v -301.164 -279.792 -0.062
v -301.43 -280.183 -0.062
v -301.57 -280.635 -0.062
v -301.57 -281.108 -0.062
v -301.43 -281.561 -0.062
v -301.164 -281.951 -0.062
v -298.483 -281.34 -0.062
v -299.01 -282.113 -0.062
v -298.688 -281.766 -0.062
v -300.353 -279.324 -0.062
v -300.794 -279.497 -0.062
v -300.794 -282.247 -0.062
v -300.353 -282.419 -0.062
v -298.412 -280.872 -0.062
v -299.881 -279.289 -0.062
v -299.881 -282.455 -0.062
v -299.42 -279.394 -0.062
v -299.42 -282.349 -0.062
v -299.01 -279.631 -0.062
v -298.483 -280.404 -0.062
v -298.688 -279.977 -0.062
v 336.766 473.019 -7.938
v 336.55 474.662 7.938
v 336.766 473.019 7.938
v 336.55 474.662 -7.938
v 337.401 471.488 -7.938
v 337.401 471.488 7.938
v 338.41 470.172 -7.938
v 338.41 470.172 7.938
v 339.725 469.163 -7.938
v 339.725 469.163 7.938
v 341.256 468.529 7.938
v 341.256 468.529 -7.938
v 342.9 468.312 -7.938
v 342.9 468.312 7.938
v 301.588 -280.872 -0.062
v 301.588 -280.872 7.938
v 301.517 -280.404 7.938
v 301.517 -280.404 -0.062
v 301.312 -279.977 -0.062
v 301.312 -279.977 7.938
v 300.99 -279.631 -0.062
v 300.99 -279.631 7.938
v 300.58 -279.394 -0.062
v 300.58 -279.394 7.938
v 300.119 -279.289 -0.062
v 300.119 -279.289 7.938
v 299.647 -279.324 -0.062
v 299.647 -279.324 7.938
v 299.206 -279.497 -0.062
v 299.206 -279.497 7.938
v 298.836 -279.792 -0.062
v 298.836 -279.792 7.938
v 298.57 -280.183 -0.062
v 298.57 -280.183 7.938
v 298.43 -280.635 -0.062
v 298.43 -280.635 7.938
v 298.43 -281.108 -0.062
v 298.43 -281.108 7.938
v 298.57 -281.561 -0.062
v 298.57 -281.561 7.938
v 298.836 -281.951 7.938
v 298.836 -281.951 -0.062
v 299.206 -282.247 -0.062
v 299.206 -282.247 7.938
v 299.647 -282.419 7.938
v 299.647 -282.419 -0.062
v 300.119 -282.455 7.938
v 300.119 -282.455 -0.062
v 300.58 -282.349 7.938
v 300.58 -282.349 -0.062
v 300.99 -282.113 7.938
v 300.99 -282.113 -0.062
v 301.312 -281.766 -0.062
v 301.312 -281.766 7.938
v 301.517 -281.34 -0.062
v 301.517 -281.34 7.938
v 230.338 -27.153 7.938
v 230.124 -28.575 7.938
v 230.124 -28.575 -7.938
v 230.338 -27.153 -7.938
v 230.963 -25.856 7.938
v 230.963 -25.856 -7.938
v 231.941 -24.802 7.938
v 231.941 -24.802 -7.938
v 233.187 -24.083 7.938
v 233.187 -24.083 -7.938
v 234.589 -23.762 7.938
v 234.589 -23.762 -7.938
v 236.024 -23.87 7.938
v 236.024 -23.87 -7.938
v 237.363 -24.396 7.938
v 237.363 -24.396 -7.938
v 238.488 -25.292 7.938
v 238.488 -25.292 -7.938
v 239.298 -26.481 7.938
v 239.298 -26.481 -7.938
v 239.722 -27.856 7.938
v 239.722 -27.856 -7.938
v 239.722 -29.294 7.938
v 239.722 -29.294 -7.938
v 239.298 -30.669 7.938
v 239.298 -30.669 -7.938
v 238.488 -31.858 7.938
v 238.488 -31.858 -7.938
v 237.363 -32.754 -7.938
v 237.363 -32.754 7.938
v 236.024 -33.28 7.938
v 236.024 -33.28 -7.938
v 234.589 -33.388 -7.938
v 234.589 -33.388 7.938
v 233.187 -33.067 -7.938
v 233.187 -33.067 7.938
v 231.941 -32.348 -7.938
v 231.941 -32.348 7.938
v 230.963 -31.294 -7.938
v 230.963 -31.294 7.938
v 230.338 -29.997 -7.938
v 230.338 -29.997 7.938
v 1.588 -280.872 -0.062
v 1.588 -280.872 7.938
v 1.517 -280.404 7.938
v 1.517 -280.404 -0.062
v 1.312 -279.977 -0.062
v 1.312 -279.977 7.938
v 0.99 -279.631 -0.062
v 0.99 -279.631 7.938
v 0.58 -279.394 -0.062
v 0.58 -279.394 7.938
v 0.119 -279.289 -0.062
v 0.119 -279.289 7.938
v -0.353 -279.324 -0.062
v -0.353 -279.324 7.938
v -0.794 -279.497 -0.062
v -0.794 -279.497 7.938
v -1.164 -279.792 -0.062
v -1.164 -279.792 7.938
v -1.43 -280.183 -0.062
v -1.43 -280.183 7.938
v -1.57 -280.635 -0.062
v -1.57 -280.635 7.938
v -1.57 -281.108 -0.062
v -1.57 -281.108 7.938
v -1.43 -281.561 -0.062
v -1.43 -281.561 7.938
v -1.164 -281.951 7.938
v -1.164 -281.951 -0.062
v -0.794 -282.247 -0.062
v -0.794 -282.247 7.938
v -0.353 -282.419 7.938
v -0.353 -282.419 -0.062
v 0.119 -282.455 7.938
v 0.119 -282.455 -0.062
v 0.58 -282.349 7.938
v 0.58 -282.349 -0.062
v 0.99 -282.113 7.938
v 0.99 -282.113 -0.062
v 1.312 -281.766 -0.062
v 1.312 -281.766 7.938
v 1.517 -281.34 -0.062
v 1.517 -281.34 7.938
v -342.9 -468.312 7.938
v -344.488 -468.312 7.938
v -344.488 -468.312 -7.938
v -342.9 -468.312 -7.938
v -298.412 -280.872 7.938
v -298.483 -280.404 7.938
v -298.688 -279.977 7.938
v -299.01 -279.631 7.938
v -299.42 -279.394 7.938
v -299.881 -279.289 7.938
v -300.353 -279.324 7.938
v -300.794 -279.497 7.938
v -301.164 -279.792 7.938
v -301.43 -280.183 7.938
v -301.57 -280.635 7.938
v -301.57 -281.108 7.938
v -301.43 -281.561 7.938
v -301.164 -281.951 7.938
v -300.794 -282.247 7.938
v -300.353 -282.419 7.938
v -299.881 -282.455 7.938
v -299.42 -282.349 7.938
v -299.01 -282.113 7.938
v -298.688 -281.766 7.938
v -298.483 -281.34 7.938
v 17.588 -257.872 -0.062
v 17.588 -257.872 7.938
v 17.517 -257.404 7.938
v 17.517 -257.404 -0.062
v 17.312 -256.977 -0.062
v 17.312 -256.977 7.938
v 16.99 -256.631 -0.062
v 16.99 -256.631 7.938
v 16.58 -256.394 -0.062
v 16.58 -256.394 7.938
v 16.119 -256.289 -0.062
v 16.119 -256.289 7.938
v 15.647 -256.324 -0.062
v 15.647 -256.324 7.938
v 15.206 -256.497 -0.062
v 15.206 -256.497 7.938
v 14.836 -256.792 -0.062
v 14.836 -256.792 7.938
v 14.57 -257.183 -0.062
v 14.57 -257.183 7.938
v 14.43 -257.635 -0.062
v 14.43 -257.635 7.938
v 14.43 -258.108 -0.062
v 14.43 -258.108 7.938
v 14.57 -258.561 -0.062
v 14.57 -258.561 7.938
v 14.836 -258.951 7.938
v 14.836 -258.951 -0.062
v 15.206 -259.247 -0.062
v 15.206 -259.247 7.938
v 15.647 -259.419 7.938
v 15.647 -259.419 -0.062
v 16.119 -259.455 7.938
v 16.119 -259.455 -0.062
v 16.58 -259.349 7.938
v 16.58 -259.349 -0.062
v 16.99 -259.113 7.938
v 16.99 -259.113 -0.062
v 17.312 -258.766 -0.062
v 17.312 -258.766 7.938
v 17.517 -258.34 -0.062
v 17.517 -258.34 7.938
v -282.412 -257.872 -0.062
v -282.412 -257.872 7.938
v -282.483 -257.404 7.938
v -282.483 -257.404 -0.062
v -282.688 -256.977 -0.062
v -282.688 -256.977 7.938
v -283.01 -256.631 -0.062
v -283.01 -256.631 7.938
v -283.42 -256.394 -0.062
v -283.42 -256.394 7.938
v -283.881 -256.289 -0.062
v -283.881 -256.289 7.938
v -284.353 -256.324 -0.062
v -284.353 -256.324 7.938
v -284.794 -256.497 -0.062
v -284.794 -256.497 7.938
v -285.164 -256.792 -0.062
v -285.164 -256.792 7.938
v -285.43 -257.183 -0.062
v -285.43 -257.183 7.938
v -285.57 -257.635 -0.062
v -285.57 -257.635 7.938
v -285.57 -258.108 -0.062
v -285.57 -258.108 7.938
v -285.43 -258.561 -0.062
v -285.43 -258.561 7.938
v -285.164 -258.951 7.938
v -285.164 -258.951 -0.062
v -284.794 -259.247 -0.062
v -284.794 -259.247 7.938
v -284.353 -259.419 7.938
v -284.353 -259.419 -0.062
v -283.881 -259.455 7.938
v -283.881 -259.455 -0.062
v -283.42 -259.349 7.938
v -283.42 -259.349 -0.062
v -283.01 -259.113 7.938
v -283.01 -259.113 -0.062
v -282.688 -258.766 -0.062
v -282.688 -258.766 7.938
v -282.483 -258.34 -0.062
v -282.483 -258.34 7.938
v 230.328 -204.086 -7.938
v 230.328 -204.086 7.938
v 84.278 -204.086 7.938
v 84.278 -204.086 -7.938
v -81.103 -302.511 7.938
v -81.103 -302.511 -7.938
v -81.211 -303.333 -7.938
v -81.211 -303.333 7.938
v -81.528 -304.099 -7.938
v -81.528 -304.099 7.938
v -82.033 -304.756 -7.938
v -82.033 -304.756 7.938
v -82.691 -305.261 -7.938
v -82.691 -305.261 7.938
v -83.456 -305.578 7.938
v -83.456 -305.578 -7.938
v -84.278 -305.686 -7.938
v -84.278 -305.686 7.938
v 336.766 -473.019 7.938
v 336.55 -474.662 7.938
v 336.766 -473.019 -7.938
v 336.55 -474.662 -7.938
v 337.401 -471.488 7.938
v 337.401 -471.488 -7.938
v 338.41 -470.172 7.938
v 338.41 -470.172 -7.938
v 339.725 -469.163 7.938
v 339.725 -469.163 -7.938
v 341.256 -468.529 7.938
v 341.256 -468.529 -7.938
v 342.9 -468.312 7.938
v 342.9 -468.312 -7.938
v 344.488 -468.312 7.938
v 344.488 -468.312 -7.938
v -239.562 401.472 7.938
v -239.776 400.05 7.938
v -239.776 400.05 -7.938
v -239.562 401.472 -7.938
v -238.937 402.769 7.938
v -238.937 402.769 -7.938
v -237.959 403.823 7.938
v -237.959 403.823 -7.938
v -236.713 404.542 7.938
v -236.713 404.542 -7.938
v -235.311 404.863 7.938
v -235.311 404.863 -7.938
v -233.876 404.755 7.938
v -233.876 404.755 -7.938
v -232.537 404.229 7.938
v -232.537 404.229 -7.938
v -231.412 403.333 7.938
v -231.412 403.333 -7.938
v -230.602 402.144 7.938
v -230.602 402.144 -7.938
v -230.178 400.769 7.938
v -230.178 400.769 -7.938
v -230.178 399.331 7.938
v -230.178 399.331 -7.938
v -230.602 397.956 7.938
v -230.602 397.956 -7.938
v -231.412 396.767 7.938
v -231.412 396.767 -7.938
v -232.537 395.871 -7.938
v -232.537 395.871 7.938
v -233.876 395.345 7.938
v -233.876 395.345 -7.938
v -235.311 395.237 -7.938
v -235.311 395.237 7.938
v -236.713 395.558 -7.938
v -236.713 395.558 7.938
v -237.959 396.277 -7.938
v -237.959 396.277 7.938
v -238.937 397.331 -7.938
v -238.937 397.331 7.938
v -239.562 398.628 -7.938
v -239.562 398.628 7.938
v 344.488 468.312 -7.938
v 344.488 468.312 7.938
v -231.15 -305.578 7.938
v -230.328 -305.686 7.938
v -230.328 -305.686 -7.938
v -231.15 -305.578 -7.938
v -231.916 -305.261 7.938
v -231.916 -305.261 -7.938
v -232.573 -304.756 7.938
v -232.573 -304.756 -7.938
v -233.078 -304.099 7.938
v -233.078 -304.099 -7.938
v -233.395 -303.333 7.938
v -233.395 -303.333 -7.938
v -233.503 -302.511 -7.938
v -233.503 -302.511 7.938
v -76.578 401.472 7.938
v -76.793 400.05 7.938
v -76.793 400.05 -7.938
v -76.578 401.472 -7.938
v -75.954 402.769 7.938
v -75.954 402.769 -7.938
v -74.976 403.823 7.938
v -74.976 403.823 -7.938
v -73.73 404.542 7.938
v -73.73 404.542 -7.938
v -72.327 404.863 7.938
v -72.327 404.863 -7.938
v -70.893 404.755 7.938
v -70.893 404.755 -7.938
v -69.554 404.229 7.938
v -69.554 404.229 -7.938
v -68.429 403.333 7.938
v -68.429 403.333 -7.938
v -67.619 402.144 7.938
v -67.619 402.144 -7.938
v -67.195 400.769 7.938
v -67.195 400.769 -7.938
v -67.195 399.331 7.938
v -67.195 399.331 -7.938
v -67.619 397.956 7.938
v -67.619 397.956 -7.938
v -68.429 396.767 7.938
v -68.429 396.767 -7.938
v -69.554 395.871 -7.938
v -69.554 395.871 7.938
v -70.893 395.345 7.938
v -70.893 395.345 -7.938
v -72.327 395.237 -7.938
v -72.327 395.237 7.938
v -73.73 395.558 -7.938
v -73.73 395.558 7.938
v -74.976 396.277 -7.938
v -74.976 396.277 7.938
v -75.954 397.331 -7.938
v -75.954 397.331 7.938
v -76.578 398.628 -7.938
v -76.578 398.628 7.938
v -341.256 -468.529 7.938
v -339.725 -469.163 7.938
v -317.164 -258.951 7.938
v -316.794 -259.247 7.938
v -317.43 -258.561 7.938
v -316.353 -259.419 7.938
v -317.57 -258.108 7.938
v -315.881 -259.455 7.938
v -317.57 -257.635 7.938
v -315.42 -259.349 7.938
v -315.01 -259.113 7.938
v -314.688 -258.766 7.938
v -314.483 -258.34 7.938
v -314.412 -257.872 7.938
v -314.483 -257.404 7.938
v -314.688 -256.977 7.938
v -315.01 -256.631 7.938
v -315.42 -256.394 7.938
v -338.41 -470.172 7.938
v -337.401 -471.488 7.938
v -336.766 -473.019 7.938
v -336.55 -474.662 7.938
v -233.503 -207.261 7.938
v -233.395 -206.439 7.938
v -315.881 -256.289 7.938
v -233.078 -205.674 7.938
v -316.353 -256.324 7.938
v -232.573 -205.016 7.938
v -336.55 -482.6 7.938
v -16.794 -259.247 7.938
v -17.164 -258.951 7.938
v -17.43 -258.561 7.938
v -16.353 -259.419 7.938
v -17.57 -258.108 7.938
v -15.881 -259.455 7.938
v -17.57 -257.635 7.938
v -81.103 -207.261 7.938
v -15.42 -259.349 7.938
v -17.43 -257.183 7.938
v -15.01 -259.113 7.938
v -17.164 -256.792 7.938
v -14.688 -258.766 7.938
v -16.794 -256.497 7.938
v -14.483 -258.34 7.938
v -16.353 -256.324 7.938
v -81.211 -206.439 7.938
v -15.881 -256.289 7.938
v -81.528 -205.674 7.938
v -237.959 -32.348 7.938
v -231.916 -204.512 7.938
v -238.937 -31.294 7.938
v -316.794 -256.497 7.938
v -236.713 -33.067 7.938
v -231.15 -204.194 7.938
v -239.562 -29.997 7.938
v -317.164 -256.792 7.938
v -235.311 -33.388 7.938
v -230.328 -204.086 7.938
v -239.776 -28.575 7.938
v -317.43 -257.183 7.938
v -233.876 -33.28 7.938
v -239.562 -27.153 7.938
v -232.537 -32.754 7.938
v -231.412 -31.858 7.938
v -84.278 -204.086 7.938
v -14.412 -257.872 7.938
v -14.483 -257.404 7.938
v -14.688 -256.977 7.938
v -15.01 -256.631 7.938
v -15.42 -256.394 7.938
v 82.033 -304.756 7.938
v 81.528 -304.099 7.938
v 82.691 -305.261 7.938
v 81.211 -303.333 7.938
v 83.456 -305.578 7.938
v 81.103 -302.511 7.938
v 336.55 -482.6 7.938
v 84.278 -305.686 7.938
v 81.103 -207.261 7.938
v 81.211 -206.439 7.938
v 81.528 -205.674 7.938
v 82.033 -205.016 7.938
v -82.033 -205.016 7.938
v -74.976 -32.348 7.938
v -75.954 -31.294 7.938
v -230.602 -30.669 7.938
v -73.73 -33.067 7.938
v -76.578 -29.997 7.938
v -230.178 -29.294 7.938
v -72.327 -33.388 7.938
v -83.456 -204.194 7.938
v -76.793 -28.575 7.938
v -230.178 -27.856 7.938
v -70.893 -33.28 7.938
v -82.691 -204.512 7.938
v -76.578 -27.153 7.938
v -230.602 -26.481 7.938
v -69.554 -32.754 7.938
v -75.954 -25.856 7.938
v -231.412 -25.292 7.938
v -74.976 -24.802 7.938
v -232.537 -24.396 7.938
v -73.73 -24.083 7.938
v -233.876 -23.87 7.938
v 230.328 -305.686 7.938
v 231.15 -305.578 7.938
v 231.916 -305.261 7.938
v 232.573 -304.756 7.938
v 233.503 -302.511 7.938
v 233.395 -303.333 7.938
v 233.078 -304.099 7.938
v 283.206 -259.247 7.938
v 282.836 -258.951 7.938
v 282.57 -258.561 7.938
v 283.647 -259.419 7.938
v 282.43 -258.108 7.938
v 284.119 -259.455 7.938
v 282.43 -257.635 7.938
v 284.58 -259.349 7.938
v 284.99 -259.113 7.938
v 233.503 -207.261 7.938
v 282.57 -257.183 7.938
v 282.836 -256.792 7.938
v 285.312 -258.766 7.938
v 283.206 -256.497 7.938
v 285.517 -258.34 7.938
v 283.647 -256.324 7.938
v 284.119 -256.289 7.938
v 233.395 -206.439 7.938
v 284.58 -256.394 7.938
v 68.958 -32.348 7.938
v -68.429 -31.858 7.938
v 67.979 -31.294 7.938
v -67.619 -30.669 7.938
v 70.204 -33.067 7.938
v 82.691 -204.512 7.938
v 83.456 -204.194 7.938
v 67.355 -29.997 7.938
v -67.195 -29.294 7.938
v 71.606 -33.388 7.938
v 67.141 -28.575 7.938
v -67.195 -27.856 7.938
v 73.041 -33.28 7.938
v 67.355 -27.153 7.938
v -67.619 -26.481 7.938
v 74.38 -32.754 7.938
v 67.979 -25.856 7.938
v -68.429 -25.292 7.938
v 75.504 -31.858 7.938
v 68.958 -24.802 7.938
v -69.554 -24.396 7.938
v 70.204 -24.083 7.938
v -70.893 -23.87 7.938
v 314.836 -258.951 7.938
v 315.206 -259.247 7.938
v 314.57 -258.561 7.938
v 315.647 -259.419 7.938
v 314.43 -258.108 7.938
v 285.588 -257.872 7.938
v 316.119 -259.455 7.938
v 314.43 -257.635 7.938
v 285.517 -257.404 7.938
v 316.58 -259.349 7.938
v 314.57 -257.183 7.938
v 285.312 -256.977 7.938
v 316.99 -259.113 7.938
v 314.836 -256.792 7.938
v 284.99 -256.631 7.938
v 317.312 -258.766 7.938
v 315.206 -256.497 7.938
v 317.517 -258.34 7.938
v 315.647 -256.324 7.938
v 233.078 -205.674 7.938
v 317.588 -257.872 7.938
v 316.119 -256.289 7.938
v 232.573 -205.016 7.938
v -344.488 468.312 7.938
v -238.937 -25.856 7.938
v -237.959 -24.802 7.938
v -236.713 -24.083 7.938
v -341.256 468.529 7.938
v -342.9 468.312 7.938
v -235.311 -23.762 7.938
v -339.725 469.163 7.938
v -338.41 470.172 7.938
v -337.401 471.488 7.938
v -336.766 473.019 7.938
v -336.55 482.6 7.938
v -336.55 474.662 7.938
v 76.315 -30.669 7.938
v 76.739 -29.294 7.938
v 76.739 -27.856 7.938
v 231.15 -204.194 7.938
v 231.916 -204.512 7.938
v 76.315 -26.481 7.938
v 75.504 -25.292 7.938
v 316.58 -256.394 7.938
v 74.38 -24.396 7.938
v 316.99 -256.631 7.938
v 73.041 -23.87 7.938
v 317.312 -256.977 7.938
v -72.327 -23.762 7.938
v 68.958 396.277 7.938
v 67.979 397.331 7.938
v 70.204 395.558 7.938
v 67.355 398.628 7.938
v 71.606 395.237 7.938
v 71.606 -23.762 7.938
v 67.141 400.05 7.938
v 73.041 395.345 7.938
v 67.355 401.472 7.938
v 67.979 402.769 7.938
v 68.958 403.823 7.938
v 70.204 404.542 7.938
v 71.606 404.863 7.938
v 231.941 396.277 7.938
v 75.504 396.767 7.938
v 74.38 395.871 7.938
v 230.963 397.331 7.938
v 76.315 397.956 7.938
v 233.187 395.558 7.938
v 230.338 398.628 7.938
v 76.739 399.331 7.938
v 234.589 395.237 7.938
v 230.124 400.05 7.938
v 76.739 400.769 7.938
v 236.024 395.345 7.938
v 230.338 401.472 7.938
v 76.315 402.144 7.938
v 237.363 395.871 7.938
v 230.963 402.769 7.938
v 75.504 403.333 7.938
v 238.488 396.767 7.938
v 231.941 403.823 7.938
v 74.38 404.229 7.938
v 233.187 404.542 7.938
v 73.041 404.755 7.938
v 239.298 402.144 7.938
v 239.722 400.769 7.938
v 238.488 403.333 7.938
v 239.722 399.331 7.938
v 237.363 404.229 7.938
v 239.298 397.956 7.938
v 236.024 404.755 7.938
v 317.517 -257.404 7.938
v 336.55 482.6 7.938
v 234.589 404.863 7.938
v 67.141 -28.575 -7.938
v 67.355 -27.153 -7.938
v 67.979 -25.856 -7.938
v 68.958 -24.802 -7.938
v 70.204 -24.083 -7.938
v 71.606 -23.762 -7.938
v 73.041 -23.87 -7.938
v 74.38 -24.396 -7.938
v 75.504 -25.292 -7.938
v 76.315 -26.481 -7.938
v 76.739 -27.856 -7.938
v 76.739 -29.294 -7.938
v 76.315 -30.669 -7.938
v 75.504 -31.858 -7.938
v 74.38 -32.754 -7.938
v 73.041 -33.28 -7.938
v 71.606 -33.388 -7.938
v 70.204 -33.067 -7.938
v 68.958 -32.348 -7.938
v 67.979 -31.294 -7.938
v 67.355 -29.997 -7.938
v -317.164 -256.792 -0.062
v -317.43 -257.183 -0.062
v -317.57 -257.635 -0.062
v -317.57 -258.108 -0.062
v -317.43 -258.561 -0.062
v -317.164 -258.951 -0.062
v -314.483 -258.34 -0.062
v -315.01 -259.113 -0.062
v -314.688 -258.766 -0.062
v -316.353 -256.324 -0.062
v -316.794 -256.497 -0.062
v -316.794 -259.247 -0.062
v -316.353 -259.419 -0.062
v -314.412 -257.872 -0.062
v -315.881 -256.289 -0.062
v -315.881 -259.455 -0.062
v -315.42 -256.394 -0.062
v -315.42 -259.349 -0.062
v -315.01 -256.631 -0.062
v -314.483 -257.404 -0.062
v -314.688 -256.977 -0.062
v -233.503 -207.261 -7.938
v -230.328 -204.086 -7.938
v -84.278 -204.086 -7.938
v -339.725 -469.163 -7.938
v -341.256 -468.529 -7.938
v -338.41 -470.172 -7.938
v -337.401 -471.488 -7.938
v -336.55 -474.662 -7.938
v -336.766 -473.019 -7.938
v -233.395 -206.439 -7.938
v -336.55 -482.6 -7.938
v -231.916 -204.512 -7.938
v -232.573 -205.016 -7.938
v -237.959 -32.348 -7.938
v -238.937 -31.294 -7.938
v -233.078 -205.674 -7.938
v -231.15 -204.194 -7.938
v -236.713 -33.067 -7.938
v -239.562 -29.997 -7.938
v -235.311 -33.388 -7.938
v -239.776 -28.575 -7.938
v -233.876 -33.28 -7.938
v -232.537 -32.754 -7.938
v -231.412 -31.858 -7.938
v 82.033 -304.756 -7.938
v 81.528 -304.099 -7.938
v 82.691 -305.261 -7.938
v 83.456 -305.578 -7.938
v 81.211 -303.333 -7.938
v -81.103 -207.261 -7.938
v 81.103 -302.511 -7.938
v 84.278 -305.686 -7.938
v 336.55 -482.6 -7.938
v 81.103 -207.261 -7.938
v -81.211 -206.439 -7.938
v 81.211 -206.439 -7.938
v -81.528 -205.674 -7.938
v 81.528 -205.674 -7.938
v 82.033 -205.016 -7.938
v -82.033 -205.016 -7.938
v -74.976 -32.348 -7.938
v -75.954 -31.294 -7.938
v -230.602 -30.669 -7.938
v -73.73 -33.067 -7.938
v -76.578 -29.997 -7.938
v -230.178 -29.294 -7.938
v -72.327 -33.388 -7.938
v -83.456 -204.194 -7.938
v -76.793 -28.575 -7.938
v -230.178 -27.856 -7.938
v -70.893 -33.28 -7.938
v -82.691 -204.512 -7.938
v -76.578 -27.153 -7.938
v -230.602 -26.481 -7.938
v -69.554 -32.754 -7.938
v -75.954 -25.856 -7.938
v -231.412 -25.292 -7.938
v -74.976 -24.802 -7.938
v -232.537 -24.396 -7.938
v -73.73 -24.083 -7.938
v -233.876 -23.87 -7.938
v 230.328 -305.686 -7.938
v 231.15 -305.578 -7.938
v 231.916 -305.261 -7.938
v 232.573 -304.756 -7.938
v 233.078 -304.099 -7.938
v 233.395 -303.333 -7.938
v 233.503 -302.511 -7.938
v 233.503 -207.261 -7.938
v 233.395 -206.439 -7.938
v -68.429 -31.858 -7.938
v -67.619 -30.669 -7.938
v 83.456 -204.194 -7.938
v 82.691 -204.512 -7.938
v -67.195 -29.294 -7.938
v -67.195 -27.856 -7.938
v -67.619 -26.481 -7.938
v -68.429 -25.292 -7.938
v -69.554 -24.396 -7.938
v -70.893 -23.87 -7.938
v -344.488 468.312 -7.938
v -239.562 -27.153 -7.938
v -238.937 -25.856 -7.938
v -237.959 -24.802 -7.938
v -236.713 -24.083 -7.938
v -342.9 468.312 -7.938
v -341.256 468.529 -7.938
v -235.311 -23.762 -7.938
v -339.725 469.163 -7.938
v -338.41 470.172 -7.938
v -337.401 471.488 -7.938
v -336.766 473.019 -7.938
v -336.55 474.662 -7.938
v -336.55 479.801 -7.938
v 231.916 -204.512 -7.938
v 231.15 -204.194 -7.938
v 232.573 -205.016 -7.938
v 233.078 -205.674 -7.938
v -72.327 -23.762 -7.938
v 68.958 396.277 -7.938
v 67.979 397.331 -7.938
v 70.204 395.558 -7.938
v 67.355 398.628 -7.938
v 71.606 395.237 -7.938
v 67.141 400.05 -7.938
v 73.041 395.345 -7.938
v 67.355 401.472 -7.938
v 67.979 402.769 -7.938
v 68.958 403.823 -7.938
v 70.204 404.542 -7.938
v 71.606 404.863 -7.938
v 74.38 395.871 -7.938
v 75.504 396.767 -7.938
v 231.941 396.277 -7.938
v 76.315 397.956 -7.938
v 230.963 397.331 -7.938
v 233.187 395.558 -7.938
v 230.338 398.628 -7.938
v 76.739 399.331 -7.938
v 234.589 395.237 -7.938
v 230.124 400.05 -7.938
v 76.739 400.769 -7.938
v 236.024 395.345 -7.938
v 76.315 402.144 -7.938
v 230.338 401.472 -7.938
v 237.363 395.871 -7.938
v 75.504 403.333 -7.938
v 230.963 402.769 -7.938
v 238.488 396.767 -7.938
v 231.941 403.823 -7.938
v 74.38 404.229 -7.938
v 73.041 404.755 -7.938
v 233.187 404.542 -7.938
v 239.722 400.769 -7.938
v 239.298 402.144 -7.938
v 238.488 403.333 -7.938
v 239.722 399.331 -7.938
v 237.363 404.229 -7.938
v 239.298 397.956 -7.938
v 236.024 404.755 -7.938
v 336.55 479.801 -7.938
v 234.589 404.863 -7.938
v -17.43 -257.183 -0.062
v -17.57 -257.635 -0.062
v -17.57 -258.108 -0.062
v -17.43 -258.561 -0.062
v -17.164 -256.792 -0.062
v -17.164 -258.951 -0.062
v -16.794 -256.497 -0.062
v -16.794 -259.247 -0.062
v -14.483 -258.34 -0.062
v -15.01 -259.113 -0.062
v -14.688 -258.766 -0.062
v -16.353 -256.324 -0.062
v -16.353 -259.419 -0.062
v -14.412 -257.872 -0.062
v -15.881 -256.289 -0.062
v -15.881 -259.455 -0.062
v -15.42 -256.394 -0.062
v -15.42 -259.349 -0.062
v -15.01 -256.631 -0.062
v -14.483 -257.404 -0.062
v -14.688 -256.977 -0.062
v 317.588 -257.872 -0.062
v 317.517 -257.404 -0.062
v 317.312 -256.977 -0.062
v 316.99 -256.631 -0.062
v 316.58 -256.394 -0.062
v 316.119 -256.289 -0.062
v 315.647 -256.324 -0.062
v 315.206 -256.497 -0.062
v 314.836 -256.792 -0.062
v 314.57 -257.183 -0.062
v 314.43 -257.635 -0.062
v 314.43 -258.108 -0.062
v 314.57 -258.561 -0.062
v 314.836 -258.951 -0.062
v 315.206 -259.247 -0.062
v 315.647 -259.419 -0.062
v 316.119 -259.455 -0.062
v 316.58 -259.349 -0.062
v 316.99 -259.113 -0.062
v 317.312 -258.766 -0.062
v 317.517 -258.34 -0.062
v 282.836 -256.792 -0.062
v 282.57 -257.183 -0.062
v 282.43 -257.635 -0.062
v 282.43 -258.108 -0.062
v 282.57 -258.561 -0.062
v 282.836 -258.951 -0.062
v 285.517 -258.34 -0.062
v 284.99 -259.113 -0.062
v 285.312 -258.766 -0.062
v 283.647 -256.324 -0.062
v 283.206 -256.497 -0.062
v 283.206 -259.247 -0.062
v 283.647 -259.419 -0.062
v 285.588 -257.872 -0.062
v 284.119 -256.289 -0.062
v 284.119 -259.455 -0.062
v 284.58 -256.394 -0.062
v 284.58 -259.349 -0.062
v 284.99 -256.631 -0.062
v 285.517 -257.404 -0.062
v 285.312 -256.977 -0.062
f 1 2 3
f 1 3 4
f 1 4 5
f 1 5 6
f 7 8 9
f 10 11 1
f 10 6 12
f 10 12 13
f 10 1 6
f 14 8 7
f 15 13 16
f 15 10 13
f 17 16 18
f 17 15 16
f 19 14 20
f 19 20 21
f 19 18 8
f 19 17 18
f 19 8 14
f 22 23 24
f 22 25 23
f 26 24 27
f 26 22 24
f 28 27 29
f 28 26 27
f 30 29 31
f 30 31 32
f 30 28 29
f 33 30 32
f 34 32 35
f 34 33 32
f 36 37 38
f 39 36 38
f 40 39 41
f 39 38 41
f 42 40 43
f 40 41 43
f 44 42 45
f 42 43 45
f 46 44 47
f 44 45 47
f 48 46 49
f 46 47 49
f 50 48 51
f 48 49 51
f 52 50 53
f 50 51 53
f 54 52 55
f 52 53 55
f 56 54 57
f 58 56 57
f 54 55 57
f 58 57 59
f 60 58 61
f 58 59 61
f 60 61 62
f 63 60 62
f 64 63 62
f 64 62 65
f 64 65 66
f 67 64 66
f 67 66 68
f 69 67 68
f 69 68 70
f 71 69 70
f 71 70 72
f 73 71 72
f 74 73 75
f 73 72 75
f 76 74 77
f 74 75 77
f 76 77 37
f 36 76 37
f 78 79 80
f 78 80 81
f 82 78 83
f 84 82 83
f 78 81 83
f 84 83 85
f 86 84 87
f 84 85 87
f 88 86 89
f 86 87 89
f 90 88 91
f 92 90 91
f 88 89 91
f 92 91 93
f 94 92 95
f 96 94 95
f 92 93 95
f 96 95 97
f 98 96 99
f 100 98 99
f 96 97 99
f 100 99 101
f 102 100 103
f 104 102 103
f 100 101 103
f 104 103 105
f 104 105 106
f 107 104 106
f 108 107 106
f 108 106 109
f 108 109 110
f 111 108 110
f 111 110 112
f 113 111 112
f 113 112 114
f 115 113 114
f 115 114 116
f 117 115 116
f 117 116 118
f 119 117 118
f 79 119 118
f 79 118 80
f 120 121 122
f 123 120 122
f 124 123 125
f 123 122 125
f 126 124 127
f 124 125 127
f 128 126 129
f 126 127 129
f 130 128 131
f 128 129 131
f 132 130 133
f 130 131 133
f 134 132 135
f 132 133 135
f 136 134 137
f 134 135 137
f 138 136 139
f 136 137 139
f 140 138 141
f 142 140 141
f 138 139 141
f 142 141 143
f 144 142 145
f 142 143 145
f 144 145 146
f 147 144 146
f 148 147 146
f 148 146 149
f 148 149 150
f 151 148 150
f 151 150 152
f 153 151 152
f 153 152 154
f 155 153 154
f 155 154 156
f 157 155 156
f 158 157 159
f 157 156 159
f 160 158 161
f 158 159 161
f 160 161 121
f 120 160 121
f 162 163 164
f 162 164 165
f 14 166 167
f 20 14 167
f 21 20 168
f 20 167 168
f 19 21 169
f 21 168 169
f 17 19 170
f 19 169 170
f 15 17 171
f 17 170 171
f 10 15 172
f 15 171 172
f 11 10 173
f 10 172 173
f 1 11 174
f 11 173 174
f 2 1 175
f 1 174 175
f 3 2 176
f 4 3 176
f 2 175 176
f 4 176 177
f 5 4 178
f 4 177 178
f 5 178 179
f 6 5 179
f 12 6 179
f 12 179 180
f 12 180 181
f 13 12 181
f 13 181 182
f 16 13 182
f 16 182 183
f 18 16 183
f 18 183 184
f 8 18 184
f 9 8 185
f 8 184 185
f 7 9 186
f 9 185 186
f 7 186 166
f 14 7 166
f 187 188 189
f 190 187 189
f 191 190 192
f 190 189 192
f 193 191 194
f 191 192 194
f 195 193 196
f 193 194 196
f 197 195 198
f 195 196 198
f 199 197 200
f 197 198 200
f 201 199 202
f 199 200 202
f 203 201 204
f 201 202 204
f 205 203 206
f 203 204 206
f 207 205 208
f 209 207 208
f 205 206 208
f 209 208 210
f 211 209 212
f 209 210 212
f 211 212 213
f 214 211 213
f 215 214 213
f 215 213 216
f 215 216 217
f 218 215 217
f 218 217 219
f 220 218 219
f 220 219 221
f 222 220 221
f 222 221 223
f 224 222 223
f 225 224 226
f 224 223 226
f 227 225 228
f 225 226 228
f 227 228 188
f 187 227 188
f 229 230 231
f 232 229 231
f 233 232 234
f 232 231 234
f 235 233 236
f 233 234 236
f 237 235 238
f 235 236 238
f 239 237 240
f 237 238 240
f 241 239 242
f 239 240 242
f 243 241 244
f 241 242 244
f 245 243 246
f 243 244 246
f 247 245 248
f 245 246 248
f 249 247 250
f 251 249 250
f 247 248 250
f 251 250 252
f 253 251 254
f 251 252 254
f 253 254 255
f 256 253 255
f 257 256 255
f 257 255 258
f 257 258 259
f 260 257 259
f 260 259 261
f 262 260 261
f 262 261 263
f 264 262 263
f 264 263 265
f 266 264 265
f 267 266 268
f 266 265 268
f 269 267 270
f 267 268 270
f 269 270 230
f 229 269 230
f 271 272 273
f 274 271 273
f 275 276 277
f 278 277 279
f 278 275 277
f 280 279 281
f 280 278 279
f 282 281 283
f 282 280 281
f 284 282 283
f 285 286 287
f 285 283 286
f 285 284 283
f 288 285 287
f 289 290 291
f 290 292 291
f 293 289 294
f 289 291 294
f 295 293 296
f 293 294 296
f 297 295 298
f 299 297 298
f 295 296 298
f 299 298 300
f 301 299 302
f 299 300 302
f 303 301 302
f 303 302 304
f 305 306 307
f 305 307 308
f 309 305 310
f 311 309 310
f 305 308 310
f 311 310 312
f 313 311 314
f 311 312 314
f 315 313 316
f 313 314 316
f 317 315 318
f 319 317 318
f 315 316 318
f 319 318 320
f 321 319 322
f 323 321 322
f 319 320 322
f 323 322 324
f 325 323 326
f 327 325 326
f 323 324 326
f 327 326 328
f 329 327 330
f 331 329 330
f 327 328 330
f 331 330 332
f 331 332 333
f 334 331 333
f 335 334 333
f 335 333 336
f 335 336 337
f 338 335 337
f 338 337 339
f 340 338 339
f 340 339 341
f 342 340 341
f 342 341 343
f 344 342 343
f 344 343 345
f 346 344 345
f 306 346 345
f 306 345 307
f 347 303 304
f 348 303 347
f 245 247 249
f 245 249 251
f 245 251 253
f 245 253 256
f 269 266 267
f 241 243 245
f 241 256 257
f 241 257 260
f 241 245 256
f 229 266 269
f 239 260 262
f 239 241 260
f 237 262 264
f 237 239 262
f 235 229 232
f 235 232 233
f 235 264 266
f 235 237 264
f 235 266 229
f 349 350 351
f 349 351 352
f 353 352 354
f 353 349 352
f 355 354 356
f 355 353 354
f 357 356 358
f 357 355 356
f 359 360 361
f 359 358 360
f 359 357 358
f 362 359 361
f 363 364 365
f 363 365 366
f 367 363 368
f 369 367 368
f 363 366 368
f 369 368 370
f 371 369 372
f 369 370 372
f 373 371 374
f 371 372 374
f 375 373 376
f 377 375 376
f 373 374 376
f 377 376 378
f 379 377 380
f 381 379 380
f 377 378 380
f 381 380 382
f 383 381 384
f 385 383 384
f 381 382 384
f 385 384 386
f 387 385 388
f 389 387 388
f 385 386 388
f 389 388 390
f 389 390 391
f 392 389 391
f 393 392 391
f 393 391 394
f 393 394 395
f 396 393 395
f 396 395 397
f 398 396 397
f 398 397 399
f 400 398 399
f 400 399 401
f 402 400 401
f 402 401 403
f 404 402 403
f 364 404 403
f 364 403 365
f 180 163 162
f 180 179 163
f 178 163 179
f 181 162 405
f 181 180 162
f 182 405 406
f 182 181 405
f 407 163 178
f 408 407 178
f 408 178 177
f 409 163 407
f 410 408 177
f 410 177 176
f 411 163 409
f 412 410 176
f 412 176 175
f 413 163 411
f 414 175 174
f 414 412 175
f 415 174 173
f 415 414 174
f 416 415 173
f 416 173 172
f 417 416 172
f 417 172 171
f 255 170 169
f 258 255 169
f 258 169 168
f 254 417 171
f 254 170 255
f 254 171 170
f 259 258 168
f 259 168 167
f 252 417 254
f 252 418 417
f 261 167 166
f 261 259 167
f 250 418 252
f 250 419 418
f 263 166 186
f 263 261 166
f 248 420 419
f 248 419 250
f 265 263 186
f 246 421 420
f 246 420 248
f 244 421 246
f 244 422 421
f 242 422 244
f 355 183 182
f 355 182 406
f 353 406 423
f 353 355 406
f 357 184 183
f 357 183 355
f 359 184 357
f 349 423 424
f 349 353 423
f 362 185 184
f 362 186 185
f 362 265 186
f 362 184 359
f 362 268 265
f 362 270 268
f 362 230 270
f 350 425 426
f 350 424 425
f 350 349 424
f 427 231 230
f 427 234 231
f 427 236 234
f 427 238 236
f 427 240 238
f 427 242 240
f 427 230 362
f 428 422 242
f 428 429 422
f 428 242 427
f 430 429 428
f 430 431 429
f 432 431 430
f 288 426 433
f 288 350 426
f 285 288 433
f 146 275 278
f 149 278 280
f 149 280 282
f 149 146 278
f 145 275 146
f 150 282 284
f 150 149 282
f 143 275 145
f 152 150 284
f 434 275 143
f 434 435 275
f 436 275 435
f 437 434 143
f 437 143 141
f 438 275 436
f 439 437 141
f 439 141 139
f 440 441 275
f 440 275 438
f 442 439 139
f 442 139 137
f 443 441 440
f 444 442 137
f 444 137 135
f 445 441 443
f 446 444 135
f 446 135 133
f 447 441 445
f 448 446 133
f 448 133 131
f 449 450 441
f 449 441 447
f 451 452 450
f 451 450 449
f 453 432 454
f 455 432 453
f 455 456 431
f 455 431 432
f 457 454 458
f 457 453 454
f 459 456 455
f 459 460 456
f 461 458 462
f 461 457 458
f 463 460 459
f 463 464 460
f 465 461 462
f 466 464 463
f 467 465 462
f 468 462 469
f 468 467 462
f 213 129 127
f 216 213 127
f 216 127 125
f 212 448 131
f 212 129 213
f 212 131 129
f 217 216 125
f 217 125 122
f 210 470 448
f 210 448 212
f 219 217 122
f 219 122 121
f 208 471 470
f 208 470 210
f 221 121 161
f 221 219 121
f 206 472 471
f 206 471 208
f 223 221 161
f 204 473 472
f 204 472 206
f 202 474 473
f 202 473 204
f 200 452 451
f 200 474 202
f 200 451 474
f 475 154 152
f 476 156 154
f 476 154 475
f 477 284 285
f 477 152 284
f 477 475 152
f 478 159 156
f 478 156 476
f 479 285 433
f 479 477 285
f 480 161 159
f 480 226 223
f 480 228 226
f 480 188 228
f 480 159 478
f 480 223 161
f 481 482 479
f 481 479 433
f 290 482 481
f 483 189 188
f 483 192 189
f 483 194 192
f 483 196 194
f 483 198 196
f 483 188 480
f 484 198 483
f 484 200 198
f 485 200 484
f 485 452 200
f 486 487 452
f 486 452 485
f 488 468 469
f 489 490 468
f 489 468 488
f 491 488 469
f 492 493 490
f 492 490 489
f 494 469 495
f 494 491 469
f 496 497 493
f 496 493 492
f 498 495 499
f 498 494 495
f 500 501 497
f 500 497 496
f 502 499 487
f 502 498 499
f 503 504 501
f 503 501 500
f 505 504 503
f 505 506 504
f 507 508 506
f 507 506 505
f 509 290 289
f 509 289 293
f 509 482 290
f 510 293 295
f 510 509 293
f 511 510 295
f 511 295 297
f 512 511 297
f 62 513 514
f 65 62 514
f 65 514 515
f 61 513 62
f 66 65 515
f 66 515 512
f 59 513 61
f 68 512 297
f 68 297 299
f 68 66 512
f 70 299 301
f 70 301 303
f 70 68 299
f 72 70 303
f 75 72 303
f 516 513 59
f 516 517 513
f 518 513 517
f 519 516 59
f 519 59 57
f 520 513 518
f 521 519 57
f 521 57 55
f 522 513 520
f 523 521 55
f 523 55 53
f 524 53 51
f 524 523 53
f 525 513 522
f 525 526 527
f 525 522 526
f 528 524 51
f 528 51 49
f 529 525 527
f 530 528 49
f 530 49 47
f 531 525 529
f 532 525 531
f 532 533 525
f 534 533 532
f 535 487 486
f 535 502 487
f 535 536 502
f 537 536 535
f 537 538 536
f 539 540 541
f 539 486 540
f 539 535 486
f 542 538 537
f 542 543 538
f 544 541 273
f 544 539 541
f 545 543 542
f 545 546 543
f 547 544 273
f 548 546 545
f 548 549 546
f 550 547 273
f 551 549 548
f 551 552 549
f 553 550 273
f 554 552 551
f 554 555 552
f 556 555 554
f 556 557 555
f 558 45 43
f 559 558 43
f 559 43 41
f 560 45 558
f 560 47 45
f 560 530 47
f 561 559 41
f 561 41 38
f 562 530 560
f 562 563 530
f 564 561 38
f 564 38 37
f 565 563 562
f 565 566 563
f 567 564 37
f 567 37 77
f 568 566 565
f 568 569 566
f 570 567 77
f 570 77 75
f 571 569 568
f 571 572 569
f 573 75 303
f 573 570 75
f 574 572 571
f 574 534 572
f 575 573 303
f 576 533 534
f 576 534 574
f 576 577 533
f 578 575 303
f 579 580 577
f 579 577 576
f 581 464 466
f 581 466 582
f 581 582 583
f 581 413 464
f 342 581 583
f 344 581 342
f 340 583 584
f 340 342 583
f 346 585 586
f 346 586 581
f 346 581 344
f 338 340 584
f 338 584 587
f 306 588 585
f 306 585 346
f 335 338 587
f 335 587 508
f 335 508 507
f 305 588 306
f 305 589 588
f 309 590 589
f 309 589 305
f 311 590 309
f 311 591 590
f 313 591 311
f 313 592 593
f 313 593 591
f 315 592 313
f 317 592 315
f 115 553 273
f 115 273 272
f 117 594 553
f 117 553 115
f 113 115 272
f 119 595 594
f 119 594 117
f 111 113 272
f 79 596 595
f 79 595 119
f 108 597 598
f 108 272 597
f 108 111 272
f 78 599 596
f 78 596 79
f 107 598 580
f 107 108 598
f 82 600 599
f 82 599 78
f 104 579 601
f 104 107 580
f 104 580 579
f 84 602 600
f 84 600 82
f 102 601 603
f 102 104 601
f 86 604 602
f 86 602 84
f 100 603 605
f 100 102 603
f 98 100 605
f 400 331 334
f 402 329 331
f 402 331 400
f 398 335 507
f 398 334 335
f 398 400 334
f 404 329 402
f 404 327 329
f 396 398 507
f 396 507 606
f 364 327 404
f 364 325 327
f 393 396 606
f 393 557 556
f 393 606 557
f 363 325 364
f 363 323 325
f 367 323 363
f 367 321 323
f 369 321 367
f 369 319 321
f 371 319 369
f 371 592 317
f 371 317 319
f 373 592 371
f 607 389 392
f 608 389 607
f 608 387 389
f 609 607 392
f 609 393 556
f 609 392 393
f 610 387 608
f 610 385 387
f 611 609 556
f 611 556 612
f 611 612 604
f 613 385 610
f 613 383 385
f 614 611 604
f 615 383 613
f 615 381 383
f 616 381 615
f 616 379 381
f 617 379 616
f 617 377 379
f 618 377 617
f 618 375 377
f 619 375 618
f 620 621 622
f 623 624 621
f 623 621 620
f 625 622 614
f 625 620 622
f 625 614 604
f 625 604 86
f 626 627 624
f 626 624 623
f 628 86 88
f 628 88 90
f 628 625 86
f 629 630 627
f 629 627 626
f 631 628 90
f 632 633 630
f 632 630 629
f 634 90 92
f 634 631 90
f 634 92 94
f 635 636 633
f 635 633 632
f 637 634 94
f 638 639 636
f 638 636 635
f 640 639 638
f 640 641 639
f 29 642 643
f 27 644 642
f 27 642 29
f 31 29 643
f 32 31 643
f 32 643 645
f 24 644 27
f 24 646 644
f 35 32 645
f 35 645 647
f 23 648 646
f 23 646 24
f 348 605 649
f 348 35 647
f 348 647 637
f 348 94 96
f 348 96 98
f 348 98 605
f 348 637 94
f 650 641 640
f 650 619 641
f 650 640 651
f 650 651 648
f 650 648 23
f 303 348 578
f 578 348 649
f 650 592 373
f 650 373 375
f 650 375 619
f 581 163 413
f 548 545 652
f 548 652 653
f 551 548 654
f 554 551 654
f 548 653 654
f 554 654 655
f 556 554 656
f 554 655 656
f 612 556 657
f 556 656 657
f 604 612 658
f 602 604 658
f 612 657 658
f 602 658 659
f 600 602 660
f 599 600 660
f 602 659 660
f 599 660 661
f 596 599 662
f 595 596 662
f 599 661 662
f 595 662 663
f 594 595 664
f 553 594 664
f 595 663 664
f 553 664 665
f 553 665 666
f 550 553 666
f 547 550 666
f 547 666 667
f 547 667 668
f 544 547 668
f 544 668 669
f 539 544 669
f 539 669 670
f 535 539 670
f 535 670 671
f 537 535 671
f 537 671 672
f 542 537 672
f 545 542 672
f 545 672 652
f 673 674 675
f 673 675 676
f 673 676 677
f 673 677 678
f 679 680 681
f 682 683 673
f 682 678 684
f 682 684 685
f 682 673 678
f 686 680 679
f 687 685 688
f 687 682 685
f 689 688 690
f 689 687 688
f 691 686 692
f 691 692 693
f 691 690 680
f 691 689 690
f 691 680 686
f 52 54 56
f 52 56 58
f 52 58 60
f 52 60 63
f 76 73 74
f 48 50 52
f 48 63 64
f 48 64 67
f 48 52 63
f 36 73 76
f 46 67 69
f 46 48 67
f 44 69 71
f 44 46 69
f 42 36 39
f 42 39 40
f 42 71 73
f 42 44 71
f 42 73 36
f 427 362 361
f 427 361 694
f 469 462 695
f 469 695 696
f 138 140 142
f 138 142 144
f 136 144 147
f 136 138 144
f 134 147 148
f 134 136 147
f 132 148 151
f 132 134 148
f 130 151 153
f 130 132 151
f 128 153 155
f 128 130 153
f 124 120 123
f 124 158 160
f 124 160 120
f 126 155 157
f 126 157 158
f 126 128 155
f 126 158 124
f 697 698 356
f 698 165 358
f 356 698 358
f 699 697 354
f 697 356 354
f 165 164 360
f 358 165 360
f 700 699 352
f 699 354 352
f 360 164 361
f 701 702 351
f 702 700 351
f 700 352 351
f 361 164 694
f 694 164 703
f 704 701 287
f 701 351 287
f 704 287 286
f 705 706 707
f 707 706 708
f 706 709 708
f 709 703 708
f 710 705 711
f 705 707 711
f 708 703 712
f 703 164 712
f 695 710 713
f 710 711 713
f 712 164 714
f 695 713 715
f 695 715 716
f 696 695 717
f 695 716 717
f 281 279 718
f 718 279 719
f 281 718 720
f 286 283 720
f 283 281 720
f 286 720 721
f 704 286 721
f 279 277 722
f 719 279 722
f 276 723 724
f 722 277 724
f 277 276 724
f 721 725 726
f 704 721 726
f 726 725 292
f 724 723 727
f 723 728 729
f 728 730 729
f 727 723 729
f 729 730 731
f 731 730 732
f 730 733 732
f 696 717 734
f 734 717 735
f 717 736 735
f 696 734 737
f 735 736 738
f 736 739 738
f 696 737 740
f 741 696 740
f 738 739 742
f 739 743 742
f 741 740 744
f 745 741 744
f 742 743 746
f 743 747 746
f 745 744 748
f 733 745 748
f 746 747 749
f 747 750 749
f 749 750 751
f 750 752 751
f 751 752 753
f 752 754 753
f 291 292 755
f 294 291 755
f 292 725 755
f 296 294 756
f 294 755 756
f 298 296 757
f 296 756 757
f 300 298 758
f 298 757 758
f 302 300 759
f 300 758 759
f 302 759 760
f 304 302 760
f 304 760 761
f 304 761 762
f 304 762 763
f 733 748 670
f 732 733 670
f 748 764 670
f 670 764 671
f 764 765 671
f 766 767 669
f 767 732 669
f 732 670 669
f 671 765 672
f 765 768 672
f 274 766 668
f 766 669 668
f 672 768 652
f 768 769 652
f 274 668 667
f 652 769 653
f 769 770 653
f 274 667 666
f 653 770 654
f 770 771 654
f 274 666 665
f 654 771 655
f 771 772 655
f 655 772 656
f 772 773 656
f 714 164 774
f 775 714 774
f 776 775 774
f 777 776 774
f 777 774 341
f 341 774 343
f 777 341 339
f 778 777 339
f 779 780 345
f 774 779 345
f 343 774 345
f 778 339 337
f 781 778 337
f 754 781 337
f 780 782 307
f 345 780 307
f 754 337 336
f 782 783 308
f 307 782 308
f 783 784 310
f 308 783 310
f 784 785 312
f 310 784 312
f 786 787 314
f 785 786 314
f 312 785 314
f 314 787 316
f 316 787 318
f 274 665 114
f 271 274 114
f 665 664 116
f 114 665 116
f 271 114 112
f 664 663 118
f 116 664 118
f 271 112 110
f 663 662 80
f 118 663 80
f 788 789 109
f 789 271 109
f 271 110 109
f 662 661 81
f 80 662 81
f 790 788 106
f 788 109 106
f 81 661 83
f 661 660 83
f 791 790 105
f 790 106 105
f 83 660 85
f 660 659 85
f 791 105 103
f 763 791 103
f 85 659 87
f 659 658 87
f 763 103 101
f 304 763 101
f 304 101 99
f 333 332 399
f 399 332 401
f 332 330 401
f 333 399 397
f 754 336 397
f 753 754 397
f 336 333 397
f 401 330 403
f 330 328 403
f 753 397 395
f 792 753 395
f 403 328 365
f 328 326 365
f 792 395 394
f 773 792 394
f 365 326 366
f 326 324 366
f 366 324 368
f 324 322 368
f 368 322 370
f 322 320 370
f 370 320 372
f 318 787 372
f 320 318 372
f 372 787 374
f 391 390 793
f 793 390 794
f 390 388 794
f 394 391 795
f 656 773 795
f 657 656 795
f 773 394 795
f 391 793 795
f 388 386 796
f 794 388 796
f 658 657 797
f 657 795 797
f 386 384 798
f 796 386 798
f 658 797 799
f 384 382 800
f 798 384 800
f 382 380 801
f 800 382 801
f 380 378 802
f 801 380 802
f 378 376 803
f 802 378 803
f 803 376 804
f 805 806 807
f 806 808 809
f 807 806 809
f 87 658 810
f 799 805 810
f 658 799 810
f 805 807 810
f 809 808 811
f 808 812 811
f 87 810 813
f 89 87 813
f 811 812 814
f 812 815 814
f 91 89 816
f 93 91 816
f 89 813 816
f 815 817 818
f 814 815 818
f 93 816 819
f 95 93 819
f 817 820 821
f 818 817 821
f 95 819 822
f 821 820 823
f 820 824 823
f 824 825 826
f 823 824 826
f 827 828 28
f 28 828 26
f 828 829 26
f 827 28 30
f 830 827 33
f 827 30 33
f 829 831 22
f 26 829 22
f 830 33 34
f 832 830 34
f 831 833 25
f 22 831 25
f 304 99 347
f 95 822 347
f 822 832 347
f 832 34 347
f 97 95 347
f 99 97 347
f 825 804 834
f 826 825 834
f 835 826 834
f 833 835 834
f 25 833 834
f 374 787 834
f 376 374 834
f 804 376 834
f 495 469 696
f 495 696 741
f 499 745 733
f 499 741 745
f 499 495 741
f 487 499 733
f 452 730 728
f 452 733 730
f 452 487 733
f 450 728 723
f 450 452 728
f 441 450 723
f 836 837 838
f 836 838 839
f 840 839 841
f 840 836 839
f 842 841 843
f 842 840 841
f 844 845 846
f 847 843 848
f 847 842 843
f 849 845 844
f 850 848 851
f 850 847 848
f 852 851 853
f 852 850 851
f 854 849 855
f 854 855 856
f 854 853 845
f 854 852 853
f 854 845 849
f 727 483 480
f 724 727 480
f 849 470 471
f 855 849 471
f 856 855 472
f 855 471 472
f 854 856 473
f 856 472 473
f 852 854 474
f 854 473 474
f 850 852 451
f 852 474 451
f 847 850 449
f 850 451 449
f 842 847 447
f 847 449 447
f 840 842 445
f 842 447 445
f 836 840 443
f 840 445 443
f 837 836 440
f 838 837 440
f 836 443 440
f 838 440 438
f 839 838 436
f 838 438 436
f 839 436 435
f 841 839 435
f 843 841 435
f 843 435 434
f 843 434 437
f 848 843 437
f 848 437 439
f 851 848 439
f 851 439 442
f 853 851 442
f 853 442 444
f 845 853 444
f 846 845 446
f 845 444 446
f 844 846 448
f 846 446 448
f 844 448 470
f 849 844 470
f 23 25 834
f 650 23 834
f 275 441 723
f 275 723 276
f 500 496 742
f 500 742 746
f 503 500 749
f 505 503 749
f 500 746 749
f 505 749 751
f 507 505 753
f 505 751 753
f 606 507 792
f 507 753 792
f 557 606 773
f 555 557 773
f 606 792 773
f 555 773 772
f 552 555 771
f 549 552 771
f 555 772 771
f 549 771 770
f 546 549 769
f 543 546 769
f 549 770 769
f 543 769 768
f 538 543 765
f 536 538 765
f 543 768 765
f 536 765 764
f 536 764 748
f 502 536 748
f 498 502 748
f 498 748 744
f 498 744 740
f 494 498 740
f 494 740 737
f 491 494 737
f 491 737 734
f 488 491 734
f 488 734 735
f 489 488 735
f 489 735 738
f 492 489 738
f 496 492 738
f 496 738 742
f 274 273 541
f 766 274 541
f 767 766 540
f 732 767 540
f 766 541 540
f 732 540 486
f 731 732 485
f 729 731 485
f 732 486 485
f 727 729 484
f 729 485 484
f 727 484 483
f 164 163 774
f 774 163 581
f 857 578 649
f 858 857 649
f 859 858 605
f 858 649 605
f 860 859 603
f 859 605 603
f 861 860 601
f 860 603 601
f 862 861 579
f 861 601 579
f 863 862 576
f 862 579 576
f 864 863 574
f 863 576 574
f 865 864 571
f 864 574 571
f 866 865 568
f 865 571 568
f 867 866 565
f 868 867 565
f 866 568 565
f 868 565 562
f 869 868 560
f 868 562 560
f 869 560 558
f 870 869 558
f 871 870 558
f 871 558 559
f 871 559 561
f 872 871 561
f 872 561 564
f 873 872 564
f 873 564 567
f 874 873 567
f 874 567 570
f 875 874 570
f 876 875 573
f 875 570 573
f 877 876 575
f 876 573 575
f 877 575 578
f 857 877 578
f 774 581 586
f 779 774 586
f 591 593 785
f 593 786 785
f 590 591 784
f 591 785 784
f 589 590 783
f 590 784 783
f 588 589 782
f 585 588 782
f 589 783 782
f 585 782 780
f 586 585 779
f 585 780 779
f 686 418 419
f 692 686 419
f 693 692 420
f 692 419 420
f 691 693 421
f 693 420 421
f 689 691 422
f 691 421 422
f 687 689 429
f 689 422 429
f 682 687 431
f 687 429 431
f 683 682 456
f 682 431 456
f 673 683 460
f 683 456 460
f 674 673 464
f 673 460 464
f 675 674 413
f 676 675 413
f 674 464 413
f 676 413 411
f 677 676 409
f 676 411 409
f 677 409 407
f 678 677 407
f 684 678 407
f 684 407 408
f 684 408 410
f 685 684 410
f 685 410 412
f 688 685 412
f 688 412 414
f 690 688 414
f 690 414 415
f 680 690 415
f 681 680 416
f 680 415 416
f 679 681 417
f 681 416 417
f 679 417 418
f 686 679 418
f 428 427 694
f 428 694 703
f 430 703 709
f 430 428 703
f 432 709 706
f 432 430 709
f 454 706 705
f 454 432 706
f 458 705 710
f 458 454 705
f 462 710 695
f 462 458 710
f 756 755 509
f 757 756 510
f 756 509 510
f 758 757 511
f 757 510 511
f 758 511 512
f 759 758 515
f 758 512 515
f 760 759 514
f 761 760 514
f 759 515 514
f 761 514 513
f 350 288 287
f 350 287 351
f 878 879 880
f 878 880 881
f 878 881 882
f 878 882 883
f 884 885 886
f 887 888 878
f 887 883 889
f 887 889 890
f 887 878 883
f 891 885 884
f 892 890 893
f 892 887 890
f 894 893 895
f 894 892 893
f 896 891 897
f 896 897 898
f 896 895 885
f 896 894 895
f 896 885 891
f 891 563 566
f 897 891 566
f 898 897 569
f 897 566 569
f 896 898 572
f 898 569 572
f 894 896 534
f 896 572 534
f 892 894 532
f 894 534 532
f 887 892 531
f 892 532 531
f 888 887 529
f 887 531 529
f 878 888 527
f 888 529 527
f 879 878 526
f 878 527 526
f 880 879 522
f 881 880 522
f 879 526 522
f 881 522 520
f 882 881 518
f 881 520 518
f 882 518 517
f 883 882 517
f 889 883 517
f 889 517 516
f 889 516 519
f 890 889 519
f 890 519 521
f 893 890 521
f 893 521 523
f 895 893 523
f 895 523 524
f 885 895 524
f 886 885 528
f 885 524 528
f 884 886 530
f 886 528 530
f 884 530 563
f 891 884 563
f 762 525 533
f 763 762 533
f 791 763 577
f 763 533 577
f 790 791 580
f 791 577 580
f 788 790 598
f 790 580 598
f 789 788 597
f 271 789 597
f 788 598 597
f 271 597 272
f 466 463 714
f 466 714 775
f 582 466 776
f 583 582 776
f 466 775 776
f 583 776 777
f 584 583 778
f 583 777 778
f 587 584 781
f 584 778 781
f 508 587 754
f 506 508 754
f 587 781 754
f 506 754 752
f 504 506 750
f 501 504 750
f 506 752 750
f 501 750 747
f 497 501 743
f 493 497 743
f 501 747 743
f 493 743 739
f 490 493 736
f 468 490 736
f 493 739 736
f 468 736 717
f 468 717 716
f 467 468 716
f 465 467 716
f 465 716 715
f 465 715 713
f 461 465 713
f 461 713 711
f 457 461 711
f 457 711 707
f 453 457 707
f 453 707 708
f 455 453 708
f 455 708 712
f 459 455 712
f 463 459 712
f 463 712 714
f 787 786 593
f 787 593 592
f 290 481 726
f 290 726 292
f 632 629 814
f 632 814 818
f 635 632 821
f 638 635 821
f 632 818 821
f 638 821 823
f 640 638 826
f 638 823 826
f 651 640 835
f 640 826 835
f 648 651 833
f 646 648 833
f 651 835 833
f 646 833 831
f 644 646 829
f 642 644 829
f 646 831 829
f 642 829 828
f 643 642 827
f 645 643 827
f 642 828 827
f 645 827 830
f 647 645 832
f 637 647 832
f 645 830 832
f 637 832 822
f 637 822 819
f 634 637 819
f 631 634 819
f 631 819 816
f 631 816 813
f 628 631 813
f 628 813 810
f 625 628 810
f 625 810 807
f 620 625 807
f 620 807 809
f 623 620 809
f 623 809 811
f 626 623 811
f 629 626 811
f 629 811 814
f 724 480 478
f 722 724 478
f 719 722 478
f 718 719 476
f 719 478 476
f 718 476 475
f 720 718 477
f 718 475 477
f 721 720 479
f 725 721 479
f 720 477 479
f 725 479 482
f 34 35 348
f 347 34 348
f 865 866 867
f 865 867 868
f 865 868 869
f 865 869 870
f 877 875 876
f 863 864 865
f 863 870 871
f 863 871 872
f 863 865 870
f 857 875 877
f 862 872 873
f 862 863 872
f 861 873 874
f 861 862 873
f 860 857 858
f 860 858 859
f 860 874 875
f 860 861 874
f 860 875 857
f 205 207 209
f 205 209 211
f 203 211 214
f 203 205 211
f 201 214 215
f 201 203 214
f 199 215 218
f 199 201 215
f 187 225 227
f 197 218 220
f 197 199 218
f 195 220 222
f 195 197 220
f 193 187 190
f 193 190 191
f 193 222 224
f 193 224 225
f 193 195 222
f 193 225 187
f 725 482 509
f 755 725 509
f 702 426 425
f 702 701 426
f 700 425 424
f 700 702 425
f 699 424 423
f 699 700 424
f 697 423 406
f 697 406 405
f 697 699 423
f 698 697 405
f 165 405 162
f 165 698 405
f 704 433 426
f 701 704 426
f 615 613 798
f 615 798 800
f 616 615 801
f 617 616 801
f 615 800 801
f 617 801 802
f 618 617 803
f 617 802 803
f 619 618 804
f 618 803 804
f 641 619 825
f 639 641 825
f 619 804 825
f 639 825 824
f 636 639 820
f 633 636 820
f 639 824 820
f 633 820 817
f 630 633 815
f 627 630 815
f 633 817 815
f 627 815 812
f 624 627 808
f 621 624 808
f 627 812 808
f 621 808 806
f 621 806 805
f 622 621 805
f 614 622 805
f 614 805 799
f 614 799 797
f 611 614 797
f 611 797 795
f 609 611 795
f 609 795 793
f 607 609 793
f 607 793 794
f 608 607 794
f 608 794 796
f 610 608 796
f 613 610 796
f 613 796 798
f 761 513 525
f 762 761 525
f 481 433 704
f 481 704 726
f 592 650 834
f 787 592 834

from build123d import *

# Parameters (mm, degrees)
SKETCH1_W               = 673.1
SKETCH1_H               = 965.2
BOSS_EXTRUDE1_DEPTH     = 7.9375
CUT_EXTRUDE1_DEPTH      = 1
CUT_EXTRUDE1_DEPTH_BACK = 16.875
CUT_EXTRUDE2_DEPTH      = 674.1
SKETCH4_W               = 7.9375
SKETCH4_H               = 936.625
BOSS_EXTRUDE2_DEPTH     = 15.875
FILLET1_R               = 6.35
SKETCH5_R               = 1.5875
CUT_EXTRUDE3_DEPTH      = 8
SKETCH6_R               = 4.826
CUT_EXTRUDE4_DEPTH      = 16.875


with BuildPart() as part:
    # Sketch1 → Boss-Extrude1 (new body, symmetric)
    with BuildSketch(Plane.XY):
        Rectangle(SKETCH1_W, SKETCH1_H)
    extrude(amount=BOSS_EXTRUDE1_DEPTH, both=True)

    # Sketch2 → Cut-Extrude1 (cut, two sides)
    with BuildSketch(Plane.XY.offset(7.9375)) as cut_extrude1_sk:
        with BuildLine():
            Line((-230.32810678, -204.086249688), (-84.27810678, -204.086249688))
            ThreePointArc((-84.27810678, -204.086249688), (-82.03304275, -205.016185658), (-81.10310678, -207.261249688))
            Line((-81.10310678, -207.261249688), (-81.10310678, -302.511249688))
            ThreePointArc((-81.10310678, -302.511249688), (-82.03304275, -304.756313718), (-84.27810678, -305.686249688))
            Line((-84.27810678, -305.686249688), (-230.32810678, -305.686249688))
            ThreePointArc((-230.32810678, -305.686249688), (-232.57317081, -304.756313718), (-233.50310678, -302.511249688))
            Line((-233.50310678, -302.511249688), (-233.50310678, -207.261249688))
            ThreePointArc((-233.50310678, -207.261249688), (-232.57317081, -205.016185658), (-230.32810678, -204.086249688))
        make_face()
        with BuildLine():
            Line((81.10310678, -207.261249688), (81.10310678, -302.511249688))
            ThreePointArc((81.10310678, -302.511249688), (82.03304275, -304.756313718), (84.27810678, -305.686249688))
            Line((84.27810678, -305.686249688), (230.32810678, -305.686249688))
            ThreePointArc((230.32810678, -305.686249688), (232.57317081, -304.756313718), (233.50310678, -302.511249688))
            Line((233.50310678, -302.511249688), (233.50310678, -207.261249688))
            ThreePointArc((233.50310678, -207.261249688), (232.57317081, -205.016185658), (230.32810678, -204.086249688))
            Line((230.32810678, -204.086249688), (84.27810678, -204.086249688))
            ThreePointArc((84.27810678, -204.086249688), (82.03304275, -205.016185658), (81.10310678, -207.261249688))
        make_face()
    extrude(amount=CUT_EXTRUDE1_DEPTH, mode=Mode.SUBTRACT)
    extrude(cut_extrude1_sk.sketch, amount=-CUT_EXTRUDE1_DEPTH_BACK, mode=Mode.SUBTRACT)

    # Sketch3 → Cut-Extrude2 (cut, through all)
    with BuildSketch(Plane(origin=(336.55, 0, 0), x_dir=(0, 0, -1), z_dir=(1, 0, 0))):
        Polygon((-7.9375, 482.6), (7.9375, 479.800809181), (7.9375, 482.6), align=None)
    extrude(amount=-CUT_EXTRUDE2_DEPTH, mode=Mode.SUBTRACT)

    # Sketch4 → Boss-Extrude2 (add)
    with BuildSketch(Plane.XY.offset(7.9375)):
        with Locations((-340.51875, 0)):
            Rectangle(SKETCH4_W, SKETCH4_H)
        with Locations((340.51875, 0)):
            Rectangle(SKETCH4_W, SKETCH4_H)
    extrude(amount=-BOSS_EXTRUDE2_DEPTH)

    # Fillet1
    fillet1_edges = [part.edges().sort_by_distance(p)[0] for p in [
        (-336.55, -468.3125, 0),
        (-336.55, 468.3125, 0),
        (336.55, 468.3125, 0),
        (336.55, -468.3125, 0),
    ]]
    fillet(fillet1_edges, radius=FILLET1_R)

    # Sketch5 → Cut-Extrude3 (cut)
    with BuildSketch(Plane.XY.offset(7.9375)):
        with Locations((-316, -257.871720704)):
            Circle(SKETCH5_R)
        with Locations((-284, -257.871720704)):
            Circle(SKETCH5_R)
        with Locations((-300, -280.871720704)):
            Circle(SKETCH5_R)
        with Locations((-16, -257.871720704)):
            Circle(SKETCH5_R)
        with Locations((16, -257.871720704)):
            Circle(SKETCH5_R)
        with Locations((0, -280.871720704)):
            Circle(SKETCH5_R)
        with Locations((284, -257.871720704)):
            Circle(SKETCH5_R)
        with Locations((300, -280.871720704)):
            Circle(SKETCH5_R)
        with Locations((316, -257.871720704)):
            Circle(SKETCH5_R)
    extrude(amount=-CUT_EXTRUDE3_DEPTH, mode=Mode.SUBTRACT)

    # Sketch6 → Cut-Extrude4 (cut, through all)
    with BuildSketch(Plane(origin=(0, 0, -7.9375), x_dir=(-1, 0, 0), z_dir=(0, 0, -1))):
        with Locations((-234.95, 400.05)):
            Circle(SKETCH6_R)
        with Locations((-71.966666709, 400.05)):
            Circle(SKETCH6_R)
        with Locations((71.966666709, 400.05)):
            Circle(SKETCH6_R)
        with Locations((234.95, 400.05)):
            Circle(SKETCH6_R)
        with Locations((-234.95, -28.575)):
            Circle(SKETCH6_R)
        with Locations((-71.966666709, -28.575)):
            Circle(SKETCH6_R)
        with Locations((71.966666709, -28.575)):
            Circle(SKETCH6_R)
        with Locations((234.95, -28.575)):
            Circle(SKETCH6_R)
    extrude(amount=-CUT_EXTRUDE4_DEPTH, mode=Mode.SUBTRACT)


solid = part.part
